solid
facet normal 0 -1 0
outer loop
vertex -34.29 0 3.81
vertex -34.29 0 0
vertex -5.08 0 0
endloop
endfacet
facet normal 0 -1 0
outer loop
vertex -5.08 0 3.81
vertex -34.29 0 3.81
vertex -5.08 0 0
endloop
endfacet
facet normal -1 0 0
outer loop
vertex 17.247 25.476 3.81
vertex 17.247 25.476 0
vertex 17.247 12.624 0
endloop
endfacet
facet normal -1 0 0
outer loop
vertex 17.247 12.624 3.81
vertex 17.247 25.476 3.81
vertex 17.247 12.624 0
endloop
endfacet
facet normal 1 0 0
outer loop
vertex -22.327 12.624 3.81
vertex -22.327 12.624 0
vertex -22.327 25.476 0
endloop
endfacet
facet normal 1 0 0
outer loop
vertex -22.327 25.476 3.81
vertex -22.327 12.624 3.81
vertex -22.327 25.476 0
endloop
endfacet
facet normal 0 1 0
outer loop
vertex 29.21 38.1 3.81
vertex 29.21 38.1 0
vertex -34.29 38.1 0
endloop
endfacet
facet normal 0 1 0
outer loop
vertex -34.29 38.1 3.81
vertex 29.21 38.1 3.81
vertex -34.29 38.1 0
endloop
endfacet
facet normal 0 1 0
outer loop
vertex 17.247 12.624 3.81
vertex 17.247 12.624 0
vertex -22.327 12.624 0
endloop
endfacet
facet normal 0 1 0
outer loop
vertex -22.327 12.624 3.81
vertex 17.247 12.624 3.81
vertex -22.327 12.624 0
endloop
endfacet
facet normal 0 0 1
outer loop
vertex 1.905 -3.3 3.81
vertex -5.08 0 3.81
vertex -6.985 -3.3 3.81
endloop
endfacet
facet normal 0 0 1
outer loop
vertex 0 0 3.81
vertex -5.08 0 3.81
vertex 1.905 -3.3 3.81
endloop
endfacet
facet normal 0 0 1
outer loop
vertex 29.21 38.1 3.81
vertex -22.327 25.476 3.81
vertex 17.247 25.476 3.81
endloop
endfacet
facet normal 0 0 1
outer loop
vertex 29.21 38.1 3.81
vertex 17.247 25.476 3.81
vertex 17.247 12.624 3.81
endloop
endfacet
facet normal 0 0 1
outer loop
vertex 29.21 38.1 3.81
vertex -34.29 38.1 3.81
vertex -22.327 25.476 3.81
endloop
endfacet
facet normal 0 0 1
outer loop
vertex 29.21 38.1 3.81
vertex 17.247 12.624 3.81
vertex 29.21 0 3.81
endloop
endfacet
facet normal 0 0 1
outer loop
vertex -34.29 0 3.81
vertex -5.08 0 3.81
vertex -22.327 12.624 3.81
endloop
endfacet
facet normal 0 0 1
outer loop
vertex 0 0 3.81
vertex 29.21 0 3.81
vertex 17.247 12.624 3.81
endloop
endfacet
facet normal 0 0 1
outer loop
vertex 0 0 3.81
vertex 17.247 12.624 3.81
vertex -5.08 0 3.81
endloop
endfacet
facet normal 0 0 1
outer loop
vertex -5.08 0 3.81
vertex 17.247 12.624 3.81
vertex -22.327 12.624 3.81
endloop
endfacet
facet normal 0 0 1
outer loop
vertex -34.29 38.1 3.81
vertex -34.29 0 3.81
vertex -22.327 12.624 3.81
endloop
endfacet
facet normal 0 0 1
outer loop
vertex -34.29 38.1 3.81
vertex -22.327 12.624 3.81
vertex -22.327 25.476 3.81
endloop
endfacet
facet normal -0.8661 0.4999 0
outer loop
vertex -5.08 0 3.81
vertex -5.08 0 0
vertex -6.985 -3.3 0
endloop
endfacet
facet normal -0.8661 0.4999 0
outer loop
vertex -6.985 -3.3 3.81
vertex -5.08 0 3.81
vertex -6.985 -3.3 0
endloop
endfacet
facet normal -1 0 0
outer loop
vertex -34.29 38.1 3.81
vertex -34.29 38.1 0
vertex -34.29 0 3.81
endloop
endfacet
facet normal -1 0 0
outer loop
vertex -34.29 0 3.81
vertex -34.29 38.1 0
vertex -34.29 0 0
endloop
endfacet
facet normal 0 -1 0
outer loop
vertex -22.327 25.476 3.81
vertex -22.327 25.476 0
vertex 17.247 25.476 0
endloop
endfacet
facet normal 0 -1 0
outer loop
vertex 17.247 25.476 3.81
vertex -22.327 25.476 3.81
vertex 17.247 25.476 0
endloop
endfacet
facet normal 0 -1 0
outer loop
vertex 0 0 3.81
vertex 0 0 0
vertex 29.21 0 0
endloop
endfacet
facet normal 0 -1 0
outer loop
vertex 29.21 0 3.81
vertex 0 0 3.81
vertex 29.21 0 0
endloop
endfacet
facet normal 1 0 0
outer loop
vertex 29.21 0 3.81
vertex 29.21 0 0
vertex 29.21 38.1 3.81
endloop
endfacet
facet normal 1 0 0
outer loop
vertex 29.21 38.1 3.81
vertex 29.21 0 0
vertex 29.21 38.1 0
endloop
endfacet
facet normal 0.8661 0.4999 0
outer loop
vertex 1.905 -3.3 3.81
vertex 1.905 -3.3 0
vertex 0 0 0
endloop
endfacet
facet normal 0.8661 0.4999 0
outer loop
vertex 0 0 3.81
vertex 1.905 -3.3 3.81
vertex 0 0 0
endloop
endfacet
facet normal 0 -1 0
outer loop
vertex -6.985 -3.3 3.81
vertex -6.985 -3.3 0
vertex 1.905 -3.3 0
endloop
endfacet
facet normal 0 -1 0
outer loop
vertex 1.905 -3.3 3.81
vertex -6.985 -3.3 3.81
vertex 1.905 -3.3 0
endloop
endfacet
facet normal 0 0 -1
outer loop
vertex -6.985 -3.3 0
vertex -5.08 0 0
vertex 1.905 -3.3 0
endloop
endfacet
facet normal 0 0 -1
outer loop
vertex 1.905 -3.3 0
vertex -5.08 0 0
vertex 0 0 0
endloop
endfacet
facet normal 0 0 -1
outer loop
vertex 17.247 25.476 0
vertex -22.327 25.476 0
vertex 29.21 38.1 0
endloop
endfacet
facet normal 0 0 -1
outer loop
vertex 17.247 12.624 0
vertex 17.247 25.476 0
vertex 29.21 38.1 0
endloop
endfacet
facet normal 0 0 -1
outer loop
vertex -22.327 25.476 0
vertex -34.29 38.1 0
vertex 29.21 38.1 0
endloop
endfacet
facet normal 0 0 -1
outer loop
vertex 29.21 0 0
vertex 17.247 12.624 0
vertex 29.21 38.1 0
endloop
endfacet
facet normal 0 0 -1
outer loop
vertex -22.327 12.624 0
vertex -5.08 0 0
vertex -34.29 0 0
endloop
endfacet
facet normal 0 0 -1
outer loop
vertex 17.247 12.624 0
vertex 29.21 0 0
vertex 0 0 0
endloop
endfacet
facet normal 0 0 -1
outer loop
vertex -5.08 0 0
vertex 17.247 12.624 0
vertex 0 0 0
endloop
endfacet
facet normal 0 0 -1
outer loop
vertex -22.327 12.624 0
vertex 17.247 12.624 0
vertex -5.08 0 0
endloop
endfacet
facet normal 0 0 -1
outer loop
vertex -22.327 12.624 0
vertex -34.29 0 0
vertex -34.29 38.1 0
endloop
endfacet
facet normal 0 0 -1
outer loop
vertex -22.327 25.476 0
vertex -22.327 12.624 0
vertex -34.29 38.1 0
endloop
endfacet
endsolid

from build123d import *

# Parameters (mm, degrees)
F1_DEPTH = 3.81


with BuildPart() as f1:
    # F0 (on Top) → F1 (new body)
    with BuildSketch(Plane.XY):
        Polygon((-34.29, 0), (-5.08, 0), (-6.985, -3.299557), (1.905, -3.299557), (0, 0), (29.21, 0), (29.21, 38.1), (-2.54, 38.1), (-34.29, 38.1), align=None)
        Polygon((-22.3266, 25.4762), (-2.54, 25.4762), (17.2466, 25.4762), (17.2466, 12.6238), (-22.3266, 12.6238), align=None, mode=Mode.SUBTRACT)
    extrude(amount=F1_DEPTH)


solid = f1.part
